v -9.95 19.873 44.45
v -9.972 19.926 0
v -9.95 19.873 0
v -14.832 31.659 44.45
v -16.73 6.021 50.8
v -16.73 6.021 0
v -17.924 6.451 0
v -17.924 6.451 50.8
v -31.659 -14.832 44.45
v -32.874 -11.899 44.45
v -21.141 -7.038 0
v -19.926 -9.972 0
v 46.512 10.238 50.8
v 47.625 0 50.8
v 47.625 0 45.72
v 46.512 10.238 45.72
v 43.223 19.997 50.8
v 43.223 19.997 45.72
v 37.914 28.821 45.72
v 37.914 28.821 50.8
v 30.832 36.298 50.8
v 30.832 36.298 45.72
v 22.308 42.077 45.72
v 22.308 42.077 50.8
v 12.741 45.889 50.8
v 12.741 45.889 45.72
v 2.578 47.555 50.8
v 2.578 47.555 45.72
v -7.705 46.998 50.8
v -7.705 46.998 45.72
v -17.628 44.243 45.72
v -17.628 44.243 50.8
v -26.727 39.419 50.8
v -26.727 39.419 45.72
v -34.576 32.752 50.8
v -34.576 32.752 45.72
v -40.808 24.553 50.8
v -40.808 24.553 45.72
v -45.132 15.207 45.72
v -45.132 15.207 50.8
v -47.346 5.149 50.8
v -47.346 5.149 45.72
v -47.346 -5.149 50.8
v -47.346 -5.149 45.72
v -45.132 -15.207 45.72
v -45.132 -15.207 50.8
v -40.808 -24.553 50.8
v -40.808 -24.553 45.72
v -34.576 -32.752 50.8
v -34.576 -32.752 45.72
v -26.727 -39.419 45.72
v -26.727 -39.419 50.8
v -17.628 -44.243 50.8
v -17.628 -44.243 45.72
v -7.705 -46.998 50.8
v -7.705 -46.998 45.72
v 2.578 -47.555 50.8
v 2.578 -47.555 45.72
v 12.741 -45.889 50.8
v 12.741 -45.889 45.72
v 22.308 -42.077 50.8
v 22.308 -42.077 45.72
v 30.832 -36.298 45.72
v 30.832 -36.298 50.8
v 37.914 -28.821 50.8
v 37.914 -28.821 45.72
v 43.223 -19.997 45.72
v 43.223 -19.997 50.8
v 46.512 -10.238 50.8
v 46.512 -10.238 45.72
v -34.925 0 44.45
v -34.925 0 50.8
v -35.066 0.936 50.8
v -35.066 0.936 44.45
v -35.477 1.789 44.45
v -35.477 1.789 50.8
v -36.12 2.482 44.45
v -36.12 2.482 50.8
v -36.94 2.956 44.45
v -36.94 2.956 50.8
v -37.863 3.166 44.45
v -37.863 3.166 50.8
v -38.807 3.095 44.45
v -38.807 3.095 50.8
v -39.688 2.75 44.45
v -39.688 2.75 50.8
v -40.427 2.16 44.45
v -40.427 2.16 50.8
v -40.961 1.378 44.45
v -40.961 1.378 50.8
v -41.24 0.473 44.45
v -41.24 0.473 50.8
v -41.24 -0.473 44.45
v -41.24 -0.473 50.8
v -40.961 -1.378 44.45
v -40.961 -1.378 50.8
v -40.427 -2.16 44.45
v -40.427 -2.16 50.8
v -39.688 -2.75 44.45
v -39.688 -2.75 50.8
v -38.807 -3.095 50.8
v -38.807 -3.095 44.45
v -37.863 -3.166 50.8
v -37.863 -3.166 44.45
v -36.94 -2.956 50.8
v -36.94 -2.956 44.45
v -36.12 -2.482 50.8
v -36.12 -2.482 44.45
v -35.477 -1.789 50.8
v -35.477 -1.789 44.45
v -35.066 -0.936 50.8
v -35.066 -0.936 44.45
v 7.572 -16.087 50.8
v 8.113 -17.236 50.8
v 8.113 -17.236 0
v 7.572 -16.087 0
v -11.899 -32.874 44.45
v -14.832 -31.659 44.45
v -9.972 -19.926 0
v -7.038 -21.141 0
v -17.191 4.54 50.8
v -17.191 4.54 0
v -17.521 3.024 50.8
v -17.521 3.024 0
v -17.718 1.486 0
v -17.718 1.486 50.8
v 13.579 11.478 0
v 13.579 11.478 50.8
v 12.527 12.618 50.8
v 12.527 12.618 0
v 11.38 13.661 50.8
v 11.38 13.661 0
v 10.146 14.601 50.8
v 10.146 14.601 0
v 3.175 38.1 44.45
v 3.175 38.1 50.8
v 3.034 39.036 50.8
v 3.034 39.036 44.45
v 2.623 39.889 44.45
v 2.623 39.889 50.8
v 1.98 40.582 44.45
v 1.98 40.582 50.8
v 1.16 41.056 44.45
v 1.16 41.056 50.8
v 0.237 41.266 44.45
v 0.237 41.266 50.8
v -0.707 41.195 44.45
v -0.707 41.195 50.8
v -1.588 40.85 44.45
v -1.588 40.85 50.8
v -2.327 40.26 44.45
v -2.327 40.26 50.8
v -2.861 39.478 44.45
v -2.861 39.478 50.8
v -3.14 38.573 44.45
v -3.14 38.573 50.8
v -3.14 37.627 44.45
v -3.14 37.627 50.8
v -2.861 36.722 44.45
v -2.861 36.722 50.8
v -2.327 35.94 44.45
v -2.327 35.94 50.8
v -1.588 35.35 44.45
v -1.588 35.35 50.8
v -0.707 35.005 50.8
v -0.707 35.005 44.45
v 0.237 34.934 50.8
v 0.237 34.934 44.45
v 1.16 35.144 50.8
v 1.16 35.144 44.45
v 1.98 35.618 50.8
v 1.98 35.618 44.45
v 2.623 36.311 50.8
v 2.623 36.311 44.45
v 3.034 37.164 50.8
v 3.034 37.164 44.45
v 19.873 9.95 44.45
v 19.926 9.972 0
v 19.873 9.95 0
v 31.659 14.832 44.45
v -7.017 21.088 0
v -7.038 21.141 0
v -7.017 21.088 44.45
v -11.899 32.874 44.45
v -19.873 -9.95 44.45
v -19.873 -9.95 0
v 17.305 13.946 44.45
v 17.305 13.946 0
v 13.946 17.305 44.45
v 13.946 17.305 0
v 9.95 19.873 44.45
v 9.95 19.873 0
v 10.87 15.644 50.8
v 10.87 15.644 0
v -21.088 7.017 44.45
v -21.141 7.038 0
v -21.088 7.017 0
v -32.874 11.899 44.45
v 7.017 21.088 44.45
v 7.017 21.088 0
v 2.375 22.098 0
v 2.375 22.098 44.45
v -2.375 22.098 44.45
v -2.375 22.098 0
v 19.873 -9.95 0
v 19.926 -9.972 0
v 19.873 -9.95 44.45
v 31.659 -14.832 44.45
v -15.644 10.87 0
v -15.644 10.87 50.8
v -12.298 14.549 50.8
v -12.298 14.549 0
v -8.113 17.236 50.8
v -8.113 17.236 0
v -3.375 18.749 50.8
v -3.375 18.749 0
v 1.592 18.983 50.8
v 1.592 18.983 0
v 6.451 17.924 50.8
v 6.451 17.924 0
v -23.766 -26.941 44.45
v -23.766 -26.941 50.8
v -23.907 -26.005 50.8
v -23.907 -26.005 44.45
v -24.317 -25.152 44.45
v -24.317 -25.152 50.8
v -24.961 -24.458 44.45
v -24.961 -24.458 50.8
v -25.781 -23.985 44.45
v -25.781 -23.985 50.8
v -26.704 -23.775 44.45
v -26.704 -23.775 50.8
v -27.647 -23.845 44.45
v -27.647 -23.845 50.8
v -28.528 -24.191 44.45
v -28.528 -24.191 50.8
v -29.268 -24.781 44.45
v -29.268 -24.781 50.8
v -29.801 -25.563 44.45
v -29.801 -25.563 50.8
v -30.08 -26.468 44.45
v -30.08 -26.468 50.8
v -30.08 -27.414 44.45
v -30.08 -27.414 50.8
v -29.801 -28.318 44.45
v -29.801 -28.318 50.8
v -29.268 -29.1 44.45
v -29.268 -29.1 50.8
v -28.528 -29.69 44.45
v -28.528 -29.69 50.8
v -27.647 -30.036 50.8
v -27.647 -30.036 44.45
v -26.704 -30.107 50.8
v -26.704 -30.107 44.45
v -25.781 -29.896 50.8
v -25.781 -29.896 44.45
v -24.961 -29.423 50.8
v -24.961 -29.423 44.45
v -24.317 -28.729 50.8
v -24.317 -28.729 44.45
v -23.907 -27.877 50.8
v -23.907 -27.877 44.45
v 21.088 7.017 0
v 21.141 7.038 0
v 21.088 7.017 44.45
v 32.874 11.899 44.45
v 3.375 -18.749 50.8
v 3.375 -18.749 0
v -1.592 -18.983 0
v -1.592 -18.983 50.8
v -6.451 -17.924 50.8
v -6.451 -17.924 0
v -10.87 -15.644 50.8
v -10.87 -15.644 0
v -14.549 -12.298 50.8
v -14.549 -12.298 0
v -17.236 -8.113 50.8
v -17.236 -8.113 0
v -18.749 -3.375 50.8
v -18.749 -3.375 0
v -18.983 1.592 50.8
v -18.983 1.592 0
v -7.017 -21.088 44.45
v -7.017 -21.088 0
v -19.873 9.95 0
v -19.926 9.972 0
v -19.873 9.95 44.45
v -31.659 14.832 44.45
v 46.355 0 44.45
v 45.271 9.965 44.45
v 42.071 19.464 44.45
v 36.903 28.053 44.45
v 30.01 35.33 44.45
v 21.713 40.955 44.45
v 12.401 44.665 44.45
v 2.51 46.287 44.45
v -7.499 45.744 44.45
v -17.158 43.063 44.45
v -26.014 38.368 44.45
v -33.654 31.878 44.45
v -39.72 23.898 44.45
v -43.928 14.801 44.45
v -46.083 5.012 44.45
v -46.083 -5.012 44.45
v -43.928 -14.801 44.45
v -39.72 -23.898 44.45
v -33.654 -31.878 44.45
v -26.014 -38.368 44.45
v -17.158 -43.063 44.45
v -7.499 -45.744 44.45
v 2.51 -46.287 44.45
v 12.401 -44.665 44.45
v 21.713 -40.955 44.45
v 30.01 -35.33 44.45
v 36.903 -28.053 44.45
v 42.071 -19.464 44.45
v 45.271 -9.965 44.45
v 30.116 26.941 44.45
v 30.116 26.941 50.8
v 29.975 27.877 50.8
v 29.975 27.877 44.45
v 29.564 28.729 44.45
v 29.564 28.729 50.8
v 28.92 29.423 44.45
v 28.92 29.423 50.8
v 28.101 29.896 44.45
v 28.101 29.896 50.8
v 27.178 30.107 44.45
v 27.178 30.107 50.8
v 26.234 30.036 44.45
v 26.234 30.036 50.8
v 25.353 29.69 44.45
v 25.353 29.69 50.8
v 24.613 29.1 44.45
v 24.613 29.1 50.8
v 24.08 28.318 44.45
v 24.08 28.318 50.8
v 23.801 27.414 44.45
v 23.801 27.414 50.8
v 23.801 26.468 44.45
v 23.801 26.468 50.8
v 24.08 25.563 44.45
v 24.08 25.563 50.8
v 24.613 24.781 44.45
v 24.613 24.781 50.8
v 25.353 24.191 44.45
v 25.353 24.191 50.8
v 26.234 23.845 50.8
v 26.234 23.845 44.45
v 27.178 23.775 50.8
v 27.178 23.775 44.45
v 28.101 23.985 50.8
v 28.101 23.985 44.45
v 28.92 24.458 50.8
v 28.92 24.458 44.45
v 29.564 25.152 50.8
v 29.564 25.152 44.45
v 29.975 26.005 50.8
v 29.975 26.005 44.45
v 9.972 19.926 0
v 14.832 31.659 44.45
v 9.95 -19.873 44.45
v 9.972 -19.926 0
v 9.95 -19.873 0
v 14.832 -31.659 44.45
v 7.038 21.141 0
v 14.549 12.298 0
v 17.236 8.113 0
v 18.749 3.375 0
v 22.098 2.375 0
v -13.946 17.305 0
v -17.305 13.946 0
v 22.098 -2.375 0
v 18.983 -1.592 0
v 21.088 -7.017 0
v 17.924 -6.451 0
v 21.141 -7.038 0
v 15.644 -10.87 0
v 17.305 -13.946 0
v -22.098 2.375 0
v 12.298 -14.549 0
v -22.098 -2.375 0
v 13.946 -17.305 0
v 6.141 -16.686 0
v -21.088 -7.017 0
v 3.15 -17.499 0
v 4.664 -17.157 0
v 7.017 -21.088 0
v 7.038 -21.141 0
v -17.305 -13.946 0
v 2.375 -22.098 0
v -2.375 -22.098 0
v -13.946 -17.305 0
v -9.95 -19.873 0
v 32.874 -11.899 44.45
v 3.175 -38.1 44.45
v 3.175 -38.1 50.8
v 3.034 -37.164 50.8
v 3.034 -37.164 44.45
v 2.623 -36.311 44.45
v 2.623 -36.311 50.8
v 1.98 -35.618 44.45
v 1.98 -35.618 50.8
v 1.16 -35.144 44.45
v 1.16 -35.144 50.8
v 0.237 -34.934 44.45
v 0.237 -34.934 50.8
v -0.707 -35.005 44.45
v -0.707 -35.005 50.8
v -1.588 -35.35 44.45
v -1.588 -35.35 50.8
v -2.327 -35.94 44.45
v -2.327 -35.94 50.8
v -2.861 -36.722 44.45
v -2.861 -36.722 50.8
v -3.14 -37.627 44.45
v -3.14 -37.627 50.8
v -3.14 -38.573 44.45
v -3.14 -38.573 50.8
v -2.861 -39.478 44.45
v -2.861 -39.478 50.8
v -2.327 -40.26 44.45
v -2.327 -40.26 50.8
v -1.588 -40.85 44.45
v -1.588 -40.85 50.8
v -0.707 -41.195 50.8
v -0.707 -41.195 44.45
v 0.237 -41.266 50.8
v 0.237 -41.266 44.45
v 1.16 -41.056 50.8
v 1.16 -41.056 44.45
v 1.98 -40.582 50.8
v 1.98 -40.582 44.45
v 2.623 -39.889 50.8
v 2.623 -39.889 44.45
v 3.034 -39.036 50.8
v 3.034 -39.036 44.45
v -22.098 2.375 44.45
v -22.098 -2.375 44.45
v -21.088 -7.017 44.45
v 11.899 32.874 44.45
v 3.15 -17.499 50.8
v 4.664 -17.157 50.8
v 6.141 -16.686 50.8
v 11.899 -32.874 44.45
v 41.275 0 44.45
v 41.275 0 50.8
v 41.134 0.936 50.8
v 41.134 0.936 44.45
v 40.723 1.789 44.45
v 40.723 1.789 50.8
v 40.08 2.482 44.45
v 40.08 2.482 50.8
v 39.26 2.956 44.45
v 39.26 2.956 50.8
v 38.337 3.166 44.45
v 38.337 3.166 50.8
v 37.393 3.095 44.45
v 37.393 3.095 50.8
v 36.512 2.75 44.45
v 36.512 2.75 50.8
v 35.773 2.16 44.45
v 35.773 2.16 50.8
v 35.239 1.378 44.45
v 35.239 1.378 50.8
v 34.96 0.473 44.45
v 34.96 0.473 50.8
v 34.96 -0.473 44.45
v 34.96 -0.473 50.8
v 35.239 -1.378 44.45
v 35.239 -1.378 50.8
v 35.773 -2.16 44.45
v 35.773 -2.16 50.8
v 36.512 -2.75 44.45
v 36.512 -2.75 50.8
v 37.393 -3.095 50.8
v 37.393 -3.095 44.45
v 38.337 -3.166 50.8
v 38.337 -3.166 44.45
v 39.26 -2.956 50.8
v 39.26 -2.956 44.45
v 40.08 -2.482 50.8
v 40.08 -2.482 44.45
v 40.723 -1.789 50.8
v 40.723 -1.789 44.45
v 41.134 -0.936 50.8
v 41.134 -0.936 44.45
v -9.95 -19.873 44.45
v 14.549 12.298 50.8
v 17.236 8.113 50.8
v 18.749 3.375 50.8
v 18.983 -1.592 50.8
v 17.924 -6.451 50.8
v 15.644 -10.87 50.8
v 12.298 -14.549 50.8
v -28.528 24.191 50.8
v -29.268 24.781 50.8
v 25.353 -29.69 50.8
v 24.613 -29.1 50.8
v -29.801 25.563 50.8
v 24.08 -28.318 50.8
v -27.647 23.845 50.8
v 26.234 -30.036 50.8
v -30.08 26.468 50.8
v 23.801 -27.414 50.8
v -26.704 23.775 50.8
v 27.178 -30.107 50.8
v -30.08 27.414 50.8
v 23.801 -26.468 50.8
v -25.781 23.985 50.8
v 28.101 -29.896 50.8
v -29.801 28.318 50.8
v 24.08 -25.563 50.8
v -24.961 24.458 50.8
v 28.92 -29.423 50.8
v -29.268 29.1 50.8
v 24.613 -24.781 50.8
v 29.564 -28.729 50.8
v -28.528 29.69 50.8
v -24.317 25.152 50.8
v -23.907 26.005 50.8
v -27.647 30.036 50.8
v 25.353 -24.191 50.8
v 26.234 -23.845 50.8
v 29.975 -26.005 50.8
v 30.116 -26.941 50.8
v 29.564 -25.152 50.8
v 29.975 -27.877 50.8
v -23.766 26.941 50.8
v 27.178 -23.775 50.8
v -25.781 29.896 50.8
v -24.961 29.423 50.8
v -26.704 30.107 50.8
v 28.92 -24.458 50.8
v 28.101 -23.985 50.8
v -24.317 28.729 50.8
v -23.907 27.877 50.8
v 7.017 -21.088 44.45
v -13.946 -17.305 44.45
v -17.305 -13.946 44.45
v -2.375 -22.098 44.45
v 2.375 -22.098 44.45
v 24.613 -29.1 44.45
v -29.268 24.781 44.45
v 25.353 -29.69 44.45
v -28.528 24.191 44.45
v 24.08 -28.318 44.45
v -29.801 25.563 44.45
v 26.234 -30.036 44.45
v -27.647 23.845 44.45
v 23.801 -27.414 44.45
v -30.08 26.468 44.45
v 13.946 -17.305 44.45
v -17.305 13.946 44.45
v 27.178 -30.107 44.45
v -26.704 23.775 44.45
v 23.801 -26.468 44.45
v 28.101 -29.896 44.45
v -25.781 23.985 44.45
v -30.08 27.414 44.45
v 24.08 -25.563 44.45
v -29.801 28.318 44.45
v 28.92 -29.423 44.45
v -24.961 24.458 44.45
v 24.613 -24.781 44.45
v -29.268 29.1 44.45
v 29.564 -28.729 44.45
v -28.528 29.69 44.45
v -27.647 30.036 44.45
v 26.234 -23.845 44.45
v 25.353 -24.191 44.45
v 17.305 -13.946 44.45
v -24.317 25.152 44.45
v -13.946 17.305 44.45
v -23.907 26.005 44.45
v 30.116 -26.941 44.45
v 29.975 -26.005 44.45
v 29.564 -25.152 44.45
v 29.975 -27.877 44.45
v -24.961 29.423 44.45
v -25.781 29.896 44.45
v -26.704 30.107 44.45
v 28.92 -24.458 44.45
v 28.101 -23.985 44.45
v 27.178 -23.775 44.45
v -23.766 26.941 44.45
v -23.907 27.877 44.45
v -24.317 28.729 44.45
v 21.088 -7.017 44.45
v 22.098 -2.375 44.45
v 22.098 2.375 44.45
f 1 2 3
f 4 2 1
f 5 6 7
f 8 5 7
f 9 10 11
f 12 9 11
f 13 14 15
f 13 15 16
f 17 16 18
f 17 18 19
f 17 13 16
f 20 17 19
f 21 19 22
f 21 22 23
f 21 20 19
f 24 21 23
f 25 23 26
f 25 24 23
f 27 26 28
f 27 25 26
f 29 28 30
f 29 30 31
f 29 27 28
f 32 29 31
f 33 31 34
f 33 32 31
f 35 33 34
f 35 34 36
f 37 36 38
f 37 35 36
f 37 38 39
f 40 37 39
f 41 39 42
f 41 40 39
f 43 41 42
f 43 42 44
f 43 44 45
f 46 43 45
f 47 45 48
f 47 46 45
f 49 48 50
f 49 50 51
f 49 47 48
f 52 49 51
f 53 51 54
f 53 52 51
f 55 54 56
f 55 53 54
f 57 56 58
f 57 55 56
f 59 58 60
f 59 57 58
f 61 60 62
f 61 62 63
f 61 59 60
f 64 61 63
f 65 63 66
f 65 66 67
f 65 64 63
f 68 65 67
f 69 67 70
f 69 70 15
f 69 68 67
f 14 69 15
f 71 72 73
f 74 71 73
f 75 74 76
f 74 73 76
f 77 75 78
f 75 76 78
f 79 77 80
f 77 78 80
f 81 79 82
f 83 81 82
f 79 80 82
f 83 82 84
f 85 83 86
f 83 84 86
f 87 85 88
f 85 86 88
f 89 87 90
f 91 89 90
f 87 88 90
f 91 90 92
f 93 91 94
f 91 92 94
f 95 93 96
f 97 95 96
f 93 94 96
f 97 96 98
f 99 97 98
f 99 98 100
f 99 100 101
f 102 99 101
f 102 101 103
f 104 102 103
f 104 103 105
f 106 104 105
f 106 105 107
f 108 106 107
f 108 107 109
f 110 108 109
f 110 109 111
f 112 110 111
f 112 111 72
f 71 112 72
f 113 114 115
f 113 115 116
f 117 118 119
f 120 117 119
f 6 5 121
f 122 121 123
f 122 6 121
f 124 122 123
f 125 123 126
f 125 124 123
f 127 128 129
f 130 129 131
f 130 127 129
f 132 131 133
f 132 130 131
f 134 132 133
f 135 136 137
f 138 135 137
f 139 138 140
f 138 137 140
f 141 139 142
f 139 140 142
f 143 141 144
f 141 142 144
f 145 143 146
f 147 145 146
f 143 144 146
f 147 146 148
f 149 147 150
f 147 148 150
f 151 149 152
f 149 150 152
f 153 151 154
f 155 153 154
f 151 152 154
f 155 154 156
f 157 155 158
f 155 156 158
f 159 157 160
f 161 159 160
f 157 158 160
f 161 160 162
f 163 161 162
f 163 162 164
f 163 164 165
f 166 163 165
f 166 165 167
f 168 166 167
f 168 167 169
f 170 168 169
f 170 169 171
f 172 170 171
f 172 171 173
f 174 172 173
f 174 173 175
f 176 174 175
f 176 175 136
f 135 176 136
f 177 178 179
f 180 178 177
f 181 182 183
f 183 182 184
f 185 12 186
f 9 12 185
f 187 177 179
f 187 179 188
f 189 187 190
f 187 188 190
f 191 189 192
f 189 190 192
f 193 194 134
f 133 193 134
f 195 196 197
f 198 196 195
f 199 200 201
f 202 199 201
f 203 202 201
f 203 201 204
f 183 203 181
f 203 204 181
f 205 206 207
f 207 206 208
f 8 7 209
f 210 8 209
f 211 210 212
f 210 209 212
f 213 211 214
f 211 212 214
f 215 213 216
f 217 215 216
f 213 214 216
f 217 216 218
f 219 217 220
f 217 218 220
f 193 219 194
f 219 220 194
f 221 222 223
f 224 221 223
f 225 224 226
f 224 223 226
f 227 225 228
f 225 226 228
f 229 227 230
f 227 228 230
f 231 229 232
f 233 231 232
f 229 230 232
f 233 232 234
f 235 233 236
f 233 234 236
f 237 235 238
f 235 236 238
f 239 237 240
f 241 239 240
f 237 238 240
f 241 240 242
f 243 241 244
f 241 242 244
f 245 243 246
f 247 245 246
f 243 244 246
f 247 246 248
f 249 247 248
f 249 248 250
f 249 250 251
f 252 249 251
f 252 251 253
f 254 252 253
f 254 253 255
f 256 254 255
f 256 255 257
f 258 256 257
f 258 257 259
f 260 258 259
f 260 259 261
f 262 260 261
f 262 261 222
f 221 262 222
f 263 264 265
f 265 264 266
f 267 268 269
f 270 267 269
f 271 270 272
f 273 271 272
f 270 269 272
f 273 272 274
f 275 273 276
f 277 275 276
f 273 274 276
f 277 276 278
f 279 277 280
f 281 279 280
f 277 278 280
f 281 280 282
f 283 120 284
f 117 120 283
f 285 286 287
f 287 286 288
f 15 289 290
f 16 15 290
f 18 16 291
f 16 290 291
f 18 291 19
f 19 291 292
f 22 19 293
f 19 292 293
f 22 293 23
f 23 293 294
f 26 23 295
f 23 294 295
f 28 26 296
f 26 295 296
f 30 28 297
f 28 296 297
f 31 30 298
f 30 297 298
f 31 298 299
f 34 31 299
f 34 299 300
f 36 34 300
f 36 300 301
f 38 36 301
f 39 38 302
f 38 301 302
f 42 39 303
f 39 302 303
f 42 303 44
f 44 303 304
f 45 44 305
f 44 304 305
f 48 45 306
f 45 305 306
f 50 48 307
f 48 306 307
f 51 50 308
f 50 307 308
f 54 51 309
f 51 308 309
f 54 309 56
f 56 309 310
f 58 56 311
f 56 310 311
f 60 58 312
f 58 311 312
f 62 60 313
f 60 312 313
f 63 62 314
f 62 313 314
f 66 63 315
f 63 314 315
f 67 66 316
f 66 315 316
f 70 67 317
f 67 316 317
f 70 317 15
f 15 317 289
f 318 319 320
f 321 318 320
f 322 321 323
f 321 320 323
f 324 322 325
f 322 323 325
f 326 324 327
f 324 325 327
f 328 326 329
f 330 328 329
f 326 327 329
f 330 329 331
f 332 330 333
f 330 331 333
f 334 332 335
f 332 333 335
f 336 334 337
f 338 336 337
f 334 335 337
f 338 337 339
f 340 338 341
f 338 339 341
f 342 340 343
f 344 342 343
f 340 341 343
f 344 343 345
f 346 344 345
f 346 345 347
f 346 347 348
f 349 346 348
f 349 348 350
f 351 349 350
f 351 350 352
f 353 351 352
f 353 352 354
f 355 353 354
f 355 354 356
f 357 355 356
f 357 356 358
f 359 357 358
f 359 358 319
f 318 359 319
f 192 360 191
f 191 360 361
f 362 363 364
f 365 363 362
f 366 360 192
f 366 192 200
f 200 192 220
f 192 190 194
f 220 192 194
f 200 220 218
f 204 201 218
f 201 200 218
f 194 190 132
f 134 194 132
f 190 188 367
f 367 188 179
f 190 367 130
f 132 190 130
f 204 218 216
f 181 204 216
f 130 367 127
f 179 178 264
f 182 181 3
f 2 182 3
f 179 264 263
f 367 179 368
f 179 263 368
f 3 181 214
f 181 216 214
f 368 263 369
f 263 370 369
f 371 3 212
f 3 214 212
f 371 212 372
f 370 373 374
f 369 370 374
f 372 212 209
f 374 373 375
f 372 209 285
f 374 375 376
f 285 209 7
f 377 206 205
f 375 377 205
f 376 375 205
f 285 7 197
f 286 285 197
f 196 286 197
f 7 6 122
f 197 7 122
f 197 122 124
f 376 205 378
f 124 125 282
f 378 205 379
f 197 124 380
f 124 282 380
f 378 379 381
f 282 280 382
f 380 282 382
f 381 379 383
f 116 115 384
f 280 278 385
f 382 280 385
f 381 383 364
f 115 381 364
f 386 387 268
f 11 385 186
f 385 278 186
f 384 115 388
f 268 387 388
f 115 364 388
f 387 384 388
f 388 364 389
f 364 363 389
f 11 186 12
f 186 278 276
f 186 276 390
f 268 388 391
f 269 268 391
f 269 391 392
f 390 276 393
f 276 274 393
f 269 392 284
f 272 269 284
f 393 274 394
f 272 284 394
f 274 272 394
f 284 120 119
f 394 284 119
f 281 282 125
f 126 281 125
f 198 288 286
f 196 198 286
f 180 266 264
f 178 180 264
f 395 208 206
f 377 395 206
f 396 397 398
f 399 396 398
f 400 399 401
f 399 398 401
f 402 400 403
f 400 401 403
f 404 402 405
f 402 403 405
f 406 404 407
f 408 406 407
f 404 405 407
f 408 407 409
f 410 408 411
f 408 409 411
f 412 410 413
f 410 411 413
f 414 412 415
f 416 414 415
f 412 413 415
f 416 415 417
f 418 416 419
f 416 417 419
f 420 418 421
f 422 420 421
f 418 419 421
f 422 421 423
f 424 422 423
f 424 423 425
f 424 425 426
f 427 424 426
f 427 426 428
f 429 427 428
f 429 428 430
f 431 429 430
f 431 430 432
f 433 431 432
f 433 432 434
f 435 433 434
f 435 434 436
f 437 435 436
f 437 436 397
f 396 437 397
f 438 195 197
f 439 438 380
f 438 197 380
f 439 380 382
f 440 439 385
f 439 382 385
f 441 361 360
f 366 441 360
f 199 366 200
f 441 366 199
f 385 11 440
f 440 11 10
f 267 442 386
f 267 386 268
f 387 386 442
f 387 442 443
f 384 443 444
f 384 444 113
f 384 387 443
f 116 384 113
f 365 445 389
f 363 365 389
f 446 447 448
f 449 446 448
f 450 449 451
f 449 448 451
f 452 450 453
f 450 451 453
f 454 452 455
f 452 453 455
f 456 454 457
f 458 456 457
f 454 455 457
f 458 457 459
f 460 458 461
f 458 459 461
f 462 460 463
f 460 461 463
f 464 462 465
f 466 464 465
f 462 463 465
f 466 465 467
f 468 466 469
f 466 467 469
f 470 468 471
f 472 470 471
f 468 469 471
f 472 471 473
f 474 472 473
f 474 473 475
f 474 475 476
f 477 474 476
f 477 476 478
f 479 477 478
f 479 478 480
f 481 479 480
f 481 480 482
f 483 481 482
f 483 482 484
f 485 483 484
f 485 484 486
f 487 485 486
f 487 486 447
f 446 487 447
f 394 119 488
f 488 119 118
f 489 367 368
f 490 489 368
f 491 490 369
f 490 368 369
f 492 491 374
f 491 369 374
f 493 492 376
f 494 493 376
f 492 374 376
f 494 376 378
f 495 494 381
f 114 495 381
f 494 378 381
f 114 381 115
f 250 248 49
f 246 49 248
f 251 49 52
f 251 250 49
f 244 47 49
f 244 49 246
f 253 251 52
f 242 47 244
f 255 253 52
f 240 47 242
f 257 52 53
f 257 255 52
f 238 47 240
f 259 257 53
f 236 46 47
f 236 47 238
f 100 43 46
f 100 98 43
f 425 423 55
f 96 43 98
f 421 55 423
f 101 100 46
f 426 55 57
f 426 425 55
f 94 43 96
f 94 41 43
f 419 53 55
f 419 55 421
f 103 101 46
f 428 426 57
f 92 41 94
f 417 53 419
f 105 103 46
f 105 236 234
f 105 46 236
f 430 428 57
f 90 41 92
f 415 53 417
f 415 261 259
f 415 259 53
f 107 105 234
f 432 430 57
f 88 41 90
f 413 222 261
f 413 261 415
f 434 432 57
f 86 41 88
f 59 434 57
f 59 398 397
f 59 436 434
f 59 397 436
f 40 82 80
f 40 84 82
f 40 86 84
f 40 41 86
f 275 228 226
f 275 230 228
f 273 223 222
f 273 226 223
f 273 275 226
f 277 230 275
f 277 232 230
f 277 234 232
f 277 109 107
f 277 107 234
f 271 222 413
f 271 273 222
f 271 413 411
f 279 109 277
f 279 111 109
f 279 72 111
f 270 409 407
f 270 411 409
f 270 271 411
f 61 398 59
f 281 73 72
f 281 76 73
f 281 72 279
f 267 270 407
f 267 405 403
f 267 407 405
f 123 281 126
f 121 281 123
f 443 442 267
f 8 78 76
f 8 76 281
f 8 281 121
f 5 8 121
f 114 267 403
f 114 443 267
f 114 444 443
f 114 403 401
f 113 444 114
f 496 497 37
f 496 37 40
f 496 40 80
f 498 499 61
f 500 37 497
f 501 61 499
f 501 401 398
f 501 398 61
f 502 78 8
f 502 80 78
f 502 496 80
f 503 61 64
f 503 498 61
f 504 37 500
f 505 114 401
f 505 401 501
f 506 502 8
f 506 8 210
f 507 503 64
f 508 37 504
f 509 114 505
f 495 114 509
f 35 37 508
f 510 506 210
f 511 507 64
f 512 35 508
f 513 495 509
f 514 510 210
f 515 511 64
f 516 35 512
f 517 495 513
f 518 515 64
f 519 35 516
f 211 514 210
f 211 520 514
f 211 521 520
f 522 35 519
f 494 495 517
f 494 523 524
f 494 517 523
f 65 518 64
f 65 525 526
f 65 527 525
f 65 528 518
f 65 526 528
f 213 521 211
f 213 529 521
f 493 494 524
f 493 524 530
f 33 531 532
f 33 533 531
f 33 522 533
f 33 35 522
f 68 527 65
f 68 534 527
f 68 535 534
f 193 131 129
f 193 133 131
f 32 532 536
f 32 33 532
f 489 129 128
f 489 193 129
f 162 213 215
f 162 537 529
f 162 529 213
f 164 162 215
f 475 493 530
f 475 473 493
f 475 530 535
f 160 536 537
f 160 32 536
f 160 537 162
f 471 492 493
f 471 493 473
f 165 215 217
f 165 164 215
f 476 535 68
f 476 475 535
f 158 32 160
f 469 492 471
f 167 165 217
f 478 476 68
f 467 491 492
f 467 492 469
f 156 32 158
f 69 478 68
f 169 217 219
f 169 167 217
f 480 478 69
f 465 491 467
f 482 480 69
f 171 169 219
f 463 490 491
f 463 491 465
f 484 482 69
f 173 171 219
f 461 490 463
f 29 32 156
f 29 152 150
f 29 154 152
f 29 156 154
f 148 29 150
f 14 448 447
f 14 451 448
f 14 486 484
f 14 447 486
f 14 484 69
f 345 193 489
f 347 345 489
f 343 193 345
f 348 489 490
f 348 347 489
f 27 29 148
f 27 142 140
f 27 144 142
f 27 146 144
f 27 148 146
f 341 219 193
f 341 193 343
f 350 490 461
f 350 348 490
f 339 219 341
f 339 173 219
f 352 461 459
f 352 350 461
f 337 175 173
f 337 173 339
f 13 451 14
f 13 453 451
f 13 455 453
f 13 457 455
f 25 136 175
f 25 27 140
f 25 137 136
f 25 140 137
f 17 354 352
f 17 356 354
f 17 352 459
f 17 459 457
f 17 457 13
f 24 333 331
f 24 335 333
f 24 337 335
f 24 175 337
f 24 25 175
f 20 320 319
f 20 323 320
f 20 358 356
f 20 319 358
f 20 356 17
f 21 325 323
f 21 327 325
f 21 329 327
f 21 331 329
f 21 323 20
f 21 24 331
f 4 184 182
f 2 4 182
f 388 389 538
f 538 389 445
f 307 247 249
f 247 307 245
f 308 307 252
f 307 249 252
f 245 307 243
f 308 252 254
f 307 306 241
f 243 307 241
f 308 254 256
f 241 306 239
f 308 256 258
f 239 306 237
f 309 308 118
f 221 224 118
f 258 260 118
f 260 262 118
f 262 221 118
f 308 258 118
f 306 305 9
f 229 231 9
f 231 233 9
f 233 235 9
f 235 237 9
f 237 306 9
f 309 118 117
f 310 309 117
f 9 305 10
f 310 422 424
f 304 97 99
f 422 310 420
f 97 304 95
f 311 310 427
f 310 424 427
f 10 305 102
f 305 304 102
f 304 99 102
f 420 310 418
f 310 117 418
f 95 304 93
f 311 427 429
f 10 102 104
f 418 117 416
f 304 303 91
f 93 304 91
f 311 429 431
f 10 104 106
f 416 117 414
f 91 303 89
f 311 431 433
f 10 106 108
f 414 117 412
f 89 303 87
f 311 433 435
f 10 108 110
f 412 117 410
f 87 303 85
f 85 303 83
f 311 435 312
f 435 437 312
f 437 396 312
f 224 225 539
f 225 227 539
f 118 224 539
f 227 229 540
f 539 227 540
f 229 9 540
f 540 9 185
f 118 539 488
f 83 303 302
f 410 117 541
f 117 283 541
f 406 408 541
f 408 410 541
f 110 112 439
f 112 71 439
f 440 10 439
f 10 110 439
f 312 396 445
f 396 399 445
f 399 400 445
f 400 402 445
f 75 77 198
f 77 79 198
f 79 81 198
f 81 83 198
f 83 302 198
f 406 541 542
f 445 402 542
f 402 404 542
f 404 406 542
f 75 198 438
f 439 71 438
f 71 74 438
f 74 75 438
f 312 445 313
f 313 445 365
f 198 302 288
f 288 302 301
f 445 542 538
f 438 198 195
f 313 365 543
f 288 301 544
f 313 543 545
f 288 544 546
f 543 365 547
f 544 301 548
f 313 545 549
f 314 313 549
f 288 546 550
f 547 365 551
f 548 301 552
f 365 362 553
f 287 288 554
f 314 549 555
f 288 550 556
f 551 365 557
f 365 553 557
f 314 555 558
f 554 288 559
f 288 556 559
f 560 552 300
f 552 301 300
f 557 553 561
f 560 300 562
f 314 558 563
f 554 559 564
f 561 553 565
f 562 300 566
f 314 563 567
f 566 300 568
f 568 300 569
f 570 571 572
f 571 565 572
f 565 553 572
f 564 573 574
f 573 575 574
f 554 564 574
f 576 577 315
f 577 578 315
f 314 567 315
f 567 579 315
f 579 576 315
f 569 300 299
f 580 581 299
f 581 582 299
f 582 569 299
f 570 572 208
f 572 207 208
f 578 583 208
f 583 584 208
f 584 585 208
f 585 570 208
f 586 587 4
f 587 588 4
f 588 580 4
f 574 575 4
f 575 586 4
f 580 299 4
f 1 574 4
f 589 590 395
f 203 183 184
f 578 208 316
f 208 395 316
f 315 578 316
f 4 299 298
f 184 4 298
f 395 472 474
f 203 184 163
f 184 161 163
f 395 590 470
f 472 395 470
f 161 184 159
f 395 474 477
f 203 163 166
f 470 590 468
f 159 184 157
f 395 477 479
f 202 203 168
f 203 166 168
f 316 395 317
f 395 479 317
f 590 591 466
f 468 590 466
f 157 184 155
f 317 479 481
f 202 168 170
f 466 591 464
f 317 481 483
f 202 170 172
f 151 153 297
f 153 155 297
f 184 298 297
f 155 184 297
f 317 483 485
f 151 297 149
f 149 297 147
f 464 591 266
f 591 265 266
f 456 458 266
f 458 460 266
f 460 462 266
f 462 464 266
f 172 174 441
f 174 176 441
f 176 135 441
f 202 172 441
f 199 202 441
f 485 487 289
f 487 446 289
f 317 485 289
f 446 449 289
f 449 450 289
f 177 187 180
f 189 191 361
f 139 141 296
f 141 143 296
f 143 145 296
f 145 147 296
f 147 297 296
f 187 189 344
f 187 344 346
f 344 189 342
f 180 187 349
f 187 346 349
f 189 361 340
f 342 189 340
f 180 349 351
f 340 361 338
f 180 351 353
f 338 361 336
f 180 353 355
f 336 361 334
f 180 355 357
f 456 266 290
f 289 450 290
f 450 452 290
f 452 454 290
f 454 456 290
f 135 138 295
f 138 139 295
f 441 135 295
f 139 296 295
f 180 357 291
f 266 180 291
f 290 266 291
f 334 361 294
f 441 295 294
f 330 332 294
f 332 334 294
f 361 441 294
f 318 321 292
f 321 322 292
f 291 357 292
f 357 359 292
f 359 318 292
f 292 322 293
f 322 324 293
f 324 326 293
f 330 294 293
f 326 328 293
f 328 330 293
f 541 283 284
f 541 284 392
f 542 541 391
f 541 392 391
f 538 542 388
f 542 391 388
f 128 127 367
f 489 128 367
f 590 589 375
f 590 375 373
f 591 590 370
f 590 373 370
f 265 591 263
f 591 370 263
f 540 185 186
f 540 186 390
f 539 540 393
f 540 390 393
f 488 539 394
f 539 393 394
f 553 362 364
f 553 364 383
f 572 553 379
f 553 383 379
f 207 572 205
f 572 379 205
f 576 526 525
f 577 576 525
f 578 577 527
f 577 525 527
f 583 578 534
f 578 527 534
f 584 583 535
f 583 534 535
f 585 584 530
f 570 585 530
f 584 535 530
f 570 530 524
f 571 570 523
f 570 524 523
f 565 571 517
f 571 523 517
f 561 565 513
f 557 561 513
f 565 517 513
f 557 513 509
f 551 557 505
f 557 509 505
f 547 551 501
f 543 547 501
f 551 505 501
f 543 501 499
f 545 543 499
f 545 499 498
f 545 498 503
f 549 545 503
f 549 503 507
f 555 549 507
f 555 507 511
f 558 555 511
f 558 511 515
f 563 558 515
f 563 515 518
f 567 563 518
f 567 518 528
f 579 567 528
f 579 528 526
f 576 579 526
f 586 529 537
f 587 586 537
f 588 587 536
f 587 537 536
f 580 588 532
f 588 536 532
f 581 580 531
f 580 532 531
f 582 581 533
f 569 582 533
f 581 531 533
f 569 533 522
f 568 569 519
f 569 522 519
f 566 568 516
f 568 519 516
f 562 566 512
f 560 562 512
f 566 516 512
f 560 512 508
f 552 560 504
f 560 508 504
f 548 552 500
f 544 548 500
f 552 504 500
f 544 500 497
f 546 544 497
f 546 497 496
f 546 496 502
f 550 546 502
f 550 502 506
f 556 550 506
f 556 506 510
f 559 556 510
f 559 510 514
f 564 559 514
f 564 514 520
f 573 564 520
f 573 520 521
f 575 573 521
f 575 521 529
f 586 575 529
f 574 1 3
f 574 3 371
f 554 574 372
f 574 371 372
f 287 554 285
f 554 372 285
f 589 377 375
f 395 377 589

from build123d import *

# Parameters (mm, degrees)
SKETCH1_R           = 22.225
SKETCH1_R_2         = 17.78
BOSS_EXTRUDE1_DEPTH = 50.8
SKETCH2_R           = 47.625
SKETCH2_R_2         = 22.225
BOSS_EXTRUDE2_DEPTH = 6.35
SKETCH3_R           = 3.175
CUT_EXTRUDE1_DEPTH  = 85.361847123
CHAMFER1_SIZE       = 1.27
BOSS_EXTRUDE3_DEPTH = 1.5875
CIRPATTERN1_COUNT   = 8
CUT_EXTRUDE3_DEPTH  = 85.361847123


with BuildPart() as part:
    # Sketch1 → Boss-Extrude1 (new body)
    with BuildSketch(Plane.XY):
        Circle(SKETCH1_R)
        Circle(SKETCH1_R_2, mode=Mode.SUBTRACT)
    extrude(amount=BOSS_EXTRUDE1_DEPTH)



with BuildPart() as body_2:
    # Sketch2 → Boss-Extrude2 (new body)
    with BuildSketch(Plane.XY.offset(50.8)):
        Circle(SKETCH2_R)
        Circle(SKETCH2_R_2, mode=Mode.SUBTRACT)
    extrude(amount=-BOSS_EXTRUDE2_DEPTH)

    # Sketch3 → Cut-Extrude1 (cut, through all)
    with BuildSketch(Plane.XY.offset(50.8)):
        with Locations((-38.1, 0)):
            Circle(SKETCH3_R)
        with Locations((-26.940768363, 26.940768363)):
            Circle(SKETCH3_R)
        with Locations((0, 38.1)):
            Circle(SKETCH3_R)
        with Locations((26.940768363, 26.940768363)):
            Circle(SKETCH3_R)
        with Locations((38.1, 0)):
            Circle(SKETCH3_R)
        with Locations((26.940768363, -26.940768363)):
            Circle(SKETCH3_R)
        with Locations((0, -38.1)):
            Circle(SKETCH3_R)
        with Locations((-26.940768363, -26.940768363)):
            Circle(SKETCH3_R)
    extrude(amount=-CUT_EXTRUDE1_DEPTH, mode=Mode.SUBTRACT)

    # Chamfer1
    chamfer1_edges = [body_2.edges().sort_by_distance(p)[0] for p in [
        (-47.625, 0, 44.45),
    ]]
    chamfer(chamfer1_edges, length=CHAMFER1_SIZE)


with BuildPart() as part_1:
    add(part.part)

    add(body_2.part)  # Boss-Extrude3 merges body 2
    # Sketch4 → Boss-Extrude3 (add, symmetric)
    with BuildSketch(Plane(origin=(0, 0, 0), x_dir=(0, 0, -1), z_dir=(0.9238795325112865, -0.3826834323650906, 0))):
        Polygon((-44.45, 34.925), (0, 22.225), (0, 21.463), (-44.45, 21.463), align=None)
    boss_extrude3 = extrude(amount=BOSS_EXTRUDE3_DEPTH, both=True)

    # CirPattern1: Boss-Extrude3 ×8 about axis
    cirpattern1_axis = Axis((0, 0, 44.45), (0, 0, 1))
    for i in range(1, CIRPATTERN1_COUNT):
        add(boss_extrude3.rotate(cirpattern1_axis, i * 360 / CIRPATTERN1_COUNT))

    # Sketch6 → Cut-Extrude3 (cut, through all)
    with BuildSketch(Plane(origin=(0, 0, 0), x_dir=(-1, 0, 0), z_dir=(0, 0, -1))):
        with BuildLine():
            ThreePointArc((-10.145726618, 14.601117471), (5.407518283, 16.937743239), (16.729503733, 6.020972085))
            Line((16.729503733, 6.020972085), (17.924468285, 6.45104152))
            ThreePointArc((17.924468285, 6.45104152), (5.793769589, 18.147582041), (-10.870421376, 15.644054433))
            Line((-10.870421376, 15.644054433), (-10.145726618, 14.601117471))
        make_face()
        with BuildLine():
            Line((18.983359245, 1.592033845), (17.717801962, 1.485898255))
            ThreePointArc((17.717801962, 1.485898255), (11.964756786, -13.151919824), (-3.150437085, -17.498661268))
            Line((-3.150437085, -17.498661268), (-3.375468305, -18.748565644))
            ThreePointArc((-3.375468305, -18.748565644), (12.81938227, -14.091342669), (18.983359245, 1.592033845))
        make_face()
        with BuildLine():
            ThreePointArc((-7.572075345, -16.087015726), (-17.372275069, -3.785823414), (-13.579066648, 11.477689183))
            Line((-13.579066648, 11.477689183), (-14.54899998, 12.297524124))
            ThreePointArc((-14.54899998, 12.297524124), (-18.61315186, -4.056239373), (-8.112937869, -17.236088278))
            Line((-8.112937869, -17.236088278), (-7.572075345, -16.087015726))
        make_face()
    extrude(amount=-CUT_EXTRUDE3_DEPTH, mode=Mode.SUBTRACT)


solid = part_1.part
